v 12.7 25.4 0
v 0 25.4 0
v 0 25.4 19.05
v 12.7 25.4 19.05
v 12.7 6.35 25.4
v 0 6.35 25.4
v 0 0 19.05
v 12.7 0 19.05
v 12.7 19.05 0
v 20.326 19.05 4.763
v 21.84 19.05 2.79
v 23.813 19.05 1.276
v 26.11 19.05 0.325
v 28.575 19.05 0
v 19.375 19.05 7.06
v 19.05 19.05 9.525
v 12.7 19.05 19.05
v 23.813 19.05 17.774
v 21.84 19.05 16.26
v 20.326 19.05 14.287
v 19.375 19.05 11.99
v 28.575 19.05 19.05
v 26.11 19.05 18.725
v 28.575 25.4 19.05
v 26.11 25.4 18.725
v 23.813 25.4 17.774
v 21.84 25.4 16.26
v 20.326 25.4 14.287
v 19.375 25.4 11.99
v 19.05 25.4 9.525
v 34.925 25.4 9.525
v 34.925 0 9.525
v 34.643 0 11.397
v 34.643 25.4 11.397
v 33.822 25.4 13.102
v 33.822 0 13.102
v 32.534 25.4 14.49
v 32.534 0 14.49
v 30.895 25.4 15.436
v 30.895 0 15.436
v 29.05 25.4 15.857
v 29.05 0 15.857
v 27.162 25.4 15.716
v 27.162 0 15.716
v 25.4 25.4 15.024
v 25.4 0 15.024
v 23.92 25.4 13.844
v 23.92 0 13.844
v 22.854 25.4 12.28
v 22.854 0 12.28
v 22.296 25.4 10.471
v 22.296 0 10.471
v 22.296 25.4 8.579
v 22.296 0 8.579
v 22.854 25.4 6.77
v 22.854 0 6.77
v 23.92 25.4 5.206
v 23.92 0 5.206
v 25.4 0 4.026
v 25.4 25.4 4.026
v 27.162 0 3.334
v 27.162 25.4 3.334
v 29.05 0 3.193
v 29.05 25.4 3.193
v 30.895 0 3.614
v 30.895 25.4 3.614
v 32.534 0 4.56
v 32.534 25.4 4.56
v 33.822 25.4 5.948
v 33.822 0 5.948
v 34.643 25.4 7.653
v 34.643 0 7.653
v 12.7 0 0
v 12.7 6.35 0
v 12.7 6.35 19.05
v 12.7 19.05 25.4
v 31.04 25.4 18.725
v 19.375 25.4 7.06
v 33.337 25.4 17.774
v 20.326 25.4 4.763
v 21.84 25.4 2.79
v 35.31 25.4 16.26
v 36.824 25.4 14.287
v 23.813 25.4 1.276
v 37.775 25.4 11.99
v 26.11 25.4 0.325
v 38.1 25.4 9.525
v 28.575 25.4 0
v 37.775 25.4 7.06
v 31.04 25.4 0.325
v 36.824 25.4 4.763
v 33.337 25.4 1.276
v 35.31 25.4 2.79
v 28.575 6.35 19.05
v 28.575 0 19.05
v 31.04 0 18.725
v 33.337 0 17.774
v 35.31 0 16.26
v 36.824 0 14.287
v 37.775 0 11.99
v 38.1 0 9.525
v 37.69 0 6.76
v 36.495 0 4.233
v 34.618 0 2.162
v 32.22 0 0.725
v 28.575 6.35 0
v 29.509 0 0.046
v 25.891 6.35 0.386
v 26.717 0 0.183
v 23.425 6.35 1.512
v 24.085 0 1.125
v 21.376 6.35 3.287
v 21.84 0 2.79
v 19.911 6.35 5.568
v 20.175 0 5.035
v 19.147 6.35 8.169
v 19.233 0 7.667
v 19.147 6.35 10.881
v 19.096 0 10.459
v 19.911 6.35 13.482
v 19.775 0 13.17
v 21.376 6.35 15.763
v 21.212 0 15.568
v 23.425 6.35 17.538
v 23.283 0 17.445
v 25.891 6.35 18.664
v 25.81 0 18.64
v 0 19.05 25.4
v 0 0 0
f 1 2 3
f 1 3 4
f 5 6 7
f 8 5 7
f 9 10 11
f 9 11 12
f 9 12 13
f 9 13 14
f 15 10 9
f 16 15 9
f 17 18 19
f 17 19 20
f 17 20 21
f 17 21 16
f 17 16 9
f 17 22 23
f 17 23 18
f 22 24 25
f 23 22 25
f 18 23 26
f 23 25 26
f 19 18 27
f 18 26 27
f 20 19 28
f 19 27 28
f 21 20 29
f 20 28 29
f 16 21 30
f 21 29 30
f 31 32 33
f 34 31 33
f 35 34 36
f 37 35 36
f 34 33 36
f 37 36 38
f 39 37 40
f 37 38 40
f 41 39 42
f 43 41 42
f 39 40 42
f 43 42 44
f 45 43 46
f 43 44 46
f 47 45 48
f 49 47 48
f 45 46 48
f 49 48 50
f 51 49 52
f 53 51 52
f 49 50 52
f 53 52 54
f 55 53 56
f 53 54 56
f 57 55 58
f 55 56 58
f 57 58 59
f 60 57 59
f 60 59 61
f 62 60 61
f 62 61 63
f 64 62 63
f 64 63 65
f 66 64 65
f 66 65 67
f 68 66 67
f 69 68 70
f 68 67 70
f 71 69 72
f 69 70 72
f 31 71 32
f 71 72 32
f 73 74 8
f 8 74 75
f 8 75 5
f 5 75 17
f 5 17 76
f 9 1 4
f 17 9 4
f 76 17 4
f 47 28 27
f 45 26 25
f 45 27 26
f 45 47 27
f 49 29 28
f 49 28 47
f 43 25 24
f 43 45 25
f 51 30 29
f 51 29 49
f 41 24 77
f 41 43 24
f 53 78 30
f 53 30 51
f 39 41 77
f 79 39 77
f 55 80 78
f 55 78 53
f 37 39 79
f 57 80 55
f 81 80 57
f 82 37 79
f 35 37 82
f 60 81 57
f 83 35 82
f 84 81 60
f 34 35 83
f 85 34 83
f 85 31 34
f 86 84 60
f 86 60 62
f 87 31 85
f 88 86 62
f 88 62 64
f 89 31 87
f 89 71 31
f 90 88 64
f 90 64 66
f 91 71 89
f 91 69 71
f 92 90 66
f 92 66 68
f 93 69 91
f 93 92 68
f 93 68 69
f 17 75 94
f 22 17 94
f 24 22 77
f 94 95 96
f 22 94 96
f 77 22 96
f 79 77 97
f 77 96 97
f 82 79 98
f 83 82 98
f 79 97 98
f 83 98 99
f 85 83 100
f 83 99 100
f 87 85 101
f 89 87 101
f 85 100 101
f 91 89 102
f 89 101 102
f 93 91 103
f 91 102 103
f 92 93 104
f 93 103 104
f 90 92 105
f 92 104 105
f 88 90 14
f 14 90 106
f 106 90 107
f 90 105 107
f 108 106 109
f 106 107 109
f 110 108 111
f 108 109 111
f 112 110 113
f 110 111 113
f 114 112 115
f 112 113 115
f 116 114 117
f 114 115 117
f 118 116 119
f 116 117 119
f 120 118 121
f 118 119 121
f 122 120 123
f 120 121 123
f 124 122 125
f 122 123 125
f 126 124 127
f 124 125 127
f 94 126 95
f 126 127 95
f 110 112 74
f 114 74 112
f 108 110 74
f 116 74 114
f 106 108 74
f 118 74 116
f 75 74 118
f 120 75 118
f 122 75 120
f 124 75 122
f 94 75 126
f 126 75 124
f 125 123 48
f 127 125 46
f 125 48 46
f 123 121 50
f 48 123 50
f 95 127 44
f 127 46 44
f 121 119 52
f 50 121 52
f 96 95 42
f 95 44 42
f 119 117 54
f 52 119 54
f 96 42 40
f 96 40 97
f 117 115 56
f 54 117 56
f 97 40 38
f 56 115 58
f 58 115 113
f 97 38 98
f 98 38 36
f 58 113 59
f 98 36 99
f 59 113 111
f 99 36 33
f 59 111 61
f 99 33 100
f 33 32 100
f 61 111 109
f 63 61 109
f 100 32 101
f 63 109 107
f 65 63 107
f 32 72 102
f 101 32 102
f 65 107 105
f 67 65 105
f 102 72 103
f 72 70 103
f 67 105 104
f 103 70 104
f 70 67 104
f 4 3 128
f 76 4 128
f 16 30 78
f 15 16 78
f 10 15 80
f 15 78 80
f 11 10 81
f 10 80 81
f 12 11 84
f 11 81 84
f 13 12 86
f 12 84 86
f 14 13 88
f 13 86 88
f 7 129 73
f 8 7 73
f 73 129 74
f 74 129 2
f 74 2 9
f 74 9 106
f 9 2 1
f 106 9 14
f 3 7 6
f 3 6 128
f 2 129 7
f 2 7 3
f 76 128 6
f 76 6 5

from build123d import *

# Parameters (mm, degrees)
F0_W     = 38.1
F0_H     = 25.4
F1_DEPTH = 25.4
F3_DEPTH = 12.7
F5_DEPTH = 25.4
F6_DEPTH = 6.35
F4_R     = 6.35
F7_DEPTH = 25.4
F9_DEPTH = 6.35


with BuildPart() as f1:
    # F0 (on Top) → F1 (new body)
    with BuildSketch(Plane.XY):
        with Locations((19.05, 12.7)):
            Rectangle(F0_W, F0_H)
    extrude(amount=F1_DEPTH)

    # F2 (on face) → F3 (cut)
    with BuildSketch(Plane(origin=(0, 0, 0), x_dir=(0, -1, 0), z_dir=(-1, 0, 0))):
        Polygon((-19.05, 25.4), (-25.4, 25.4), (-25.4, 19.05), align=None)
        Polygon((0, 19.05), (0, 25.4), (-6.35, 25.4), align=None)
    extrude(amount=-F3_DEPTH, mode=Mode.SUBTRACT)

    # F4 (on face) → F5 (cut)
    with BuildSketch(Plane.XZ):
        with BuildLine():
            ThreePointArc((28.575, 19.05), (35.3101920908, 16.2601920908), (38.1, 9.525))
            Line((38.1, 9.525), (38.1, 25.4))
            Line((38.1, 25.4), (12.7, 25.4))
            Line((12.7, 25.4), (12.7, 19.05))
            Line((12.7, 19.05), (28.575, 19.05))
        make_face()
        with BuildLine():
            Line((38.1, 0), (38.1, 9.525))
            ThreePointArc((38.1, 9.525), (35.3101920908, 2.7898079092), (28.575, 0))
            Line((28.575, 0), (38.1, 0))
        make_face()
    extrude(amount=-F5_DEPTH, mode=Mode.SUBTRACT)

    # F4 (on face) → F6 (cut)
    with BuildSketch(Plane.XZ):
        with BuildLine():
            ThreePointArc((28.575, 0), (19.05, 9.525), (28.575, 19.05))
            Line((28.575, 19.05), (12.7, 19.05))
            Line((12.7, 19.05), (12.7, 0))
            Line((12.7, 0), (28.575, 0))
        make_face()
    extrude(amount=-F6_DEPTH, mode=Mode.SUBTRACT)

    # F4 (on face) → F7 (cut)
    with BuildSketch(Plane.XZ):
        with Locations((28.575, 9.525)):
            Circle(F4_R)
    extrude(amount=-F7_DEPTH, mode=Mode.SUBTRACT)

    # F8 (on face) → F9 (cut)
    with BuildSketch(Plane(origin=(0, 25.4, 0), x_dir=(-1, 0, 0), z_dir=(0, 1, 0))):
        with BuildLine():
            ThreePointArc((-28.575, 19.05), (-21.8398079092, 16.2601920908), (-19.05, 9.525))
            ThreePointArc((-19.05, 9.525), (-21.8398079092, 2.7898079092), (-28.575, 0))
            Line((-28.575, 0), (-12.7, 0))
            Line((-12.7, 0), (-12.7, 19.05))
            Line((-12.7, 19.05), (-28.575, 19.05))
        make_face()
    extrude(amount=-F9_DEPTH, mode=Mode.SUBTRACT)


solid = f1.part
